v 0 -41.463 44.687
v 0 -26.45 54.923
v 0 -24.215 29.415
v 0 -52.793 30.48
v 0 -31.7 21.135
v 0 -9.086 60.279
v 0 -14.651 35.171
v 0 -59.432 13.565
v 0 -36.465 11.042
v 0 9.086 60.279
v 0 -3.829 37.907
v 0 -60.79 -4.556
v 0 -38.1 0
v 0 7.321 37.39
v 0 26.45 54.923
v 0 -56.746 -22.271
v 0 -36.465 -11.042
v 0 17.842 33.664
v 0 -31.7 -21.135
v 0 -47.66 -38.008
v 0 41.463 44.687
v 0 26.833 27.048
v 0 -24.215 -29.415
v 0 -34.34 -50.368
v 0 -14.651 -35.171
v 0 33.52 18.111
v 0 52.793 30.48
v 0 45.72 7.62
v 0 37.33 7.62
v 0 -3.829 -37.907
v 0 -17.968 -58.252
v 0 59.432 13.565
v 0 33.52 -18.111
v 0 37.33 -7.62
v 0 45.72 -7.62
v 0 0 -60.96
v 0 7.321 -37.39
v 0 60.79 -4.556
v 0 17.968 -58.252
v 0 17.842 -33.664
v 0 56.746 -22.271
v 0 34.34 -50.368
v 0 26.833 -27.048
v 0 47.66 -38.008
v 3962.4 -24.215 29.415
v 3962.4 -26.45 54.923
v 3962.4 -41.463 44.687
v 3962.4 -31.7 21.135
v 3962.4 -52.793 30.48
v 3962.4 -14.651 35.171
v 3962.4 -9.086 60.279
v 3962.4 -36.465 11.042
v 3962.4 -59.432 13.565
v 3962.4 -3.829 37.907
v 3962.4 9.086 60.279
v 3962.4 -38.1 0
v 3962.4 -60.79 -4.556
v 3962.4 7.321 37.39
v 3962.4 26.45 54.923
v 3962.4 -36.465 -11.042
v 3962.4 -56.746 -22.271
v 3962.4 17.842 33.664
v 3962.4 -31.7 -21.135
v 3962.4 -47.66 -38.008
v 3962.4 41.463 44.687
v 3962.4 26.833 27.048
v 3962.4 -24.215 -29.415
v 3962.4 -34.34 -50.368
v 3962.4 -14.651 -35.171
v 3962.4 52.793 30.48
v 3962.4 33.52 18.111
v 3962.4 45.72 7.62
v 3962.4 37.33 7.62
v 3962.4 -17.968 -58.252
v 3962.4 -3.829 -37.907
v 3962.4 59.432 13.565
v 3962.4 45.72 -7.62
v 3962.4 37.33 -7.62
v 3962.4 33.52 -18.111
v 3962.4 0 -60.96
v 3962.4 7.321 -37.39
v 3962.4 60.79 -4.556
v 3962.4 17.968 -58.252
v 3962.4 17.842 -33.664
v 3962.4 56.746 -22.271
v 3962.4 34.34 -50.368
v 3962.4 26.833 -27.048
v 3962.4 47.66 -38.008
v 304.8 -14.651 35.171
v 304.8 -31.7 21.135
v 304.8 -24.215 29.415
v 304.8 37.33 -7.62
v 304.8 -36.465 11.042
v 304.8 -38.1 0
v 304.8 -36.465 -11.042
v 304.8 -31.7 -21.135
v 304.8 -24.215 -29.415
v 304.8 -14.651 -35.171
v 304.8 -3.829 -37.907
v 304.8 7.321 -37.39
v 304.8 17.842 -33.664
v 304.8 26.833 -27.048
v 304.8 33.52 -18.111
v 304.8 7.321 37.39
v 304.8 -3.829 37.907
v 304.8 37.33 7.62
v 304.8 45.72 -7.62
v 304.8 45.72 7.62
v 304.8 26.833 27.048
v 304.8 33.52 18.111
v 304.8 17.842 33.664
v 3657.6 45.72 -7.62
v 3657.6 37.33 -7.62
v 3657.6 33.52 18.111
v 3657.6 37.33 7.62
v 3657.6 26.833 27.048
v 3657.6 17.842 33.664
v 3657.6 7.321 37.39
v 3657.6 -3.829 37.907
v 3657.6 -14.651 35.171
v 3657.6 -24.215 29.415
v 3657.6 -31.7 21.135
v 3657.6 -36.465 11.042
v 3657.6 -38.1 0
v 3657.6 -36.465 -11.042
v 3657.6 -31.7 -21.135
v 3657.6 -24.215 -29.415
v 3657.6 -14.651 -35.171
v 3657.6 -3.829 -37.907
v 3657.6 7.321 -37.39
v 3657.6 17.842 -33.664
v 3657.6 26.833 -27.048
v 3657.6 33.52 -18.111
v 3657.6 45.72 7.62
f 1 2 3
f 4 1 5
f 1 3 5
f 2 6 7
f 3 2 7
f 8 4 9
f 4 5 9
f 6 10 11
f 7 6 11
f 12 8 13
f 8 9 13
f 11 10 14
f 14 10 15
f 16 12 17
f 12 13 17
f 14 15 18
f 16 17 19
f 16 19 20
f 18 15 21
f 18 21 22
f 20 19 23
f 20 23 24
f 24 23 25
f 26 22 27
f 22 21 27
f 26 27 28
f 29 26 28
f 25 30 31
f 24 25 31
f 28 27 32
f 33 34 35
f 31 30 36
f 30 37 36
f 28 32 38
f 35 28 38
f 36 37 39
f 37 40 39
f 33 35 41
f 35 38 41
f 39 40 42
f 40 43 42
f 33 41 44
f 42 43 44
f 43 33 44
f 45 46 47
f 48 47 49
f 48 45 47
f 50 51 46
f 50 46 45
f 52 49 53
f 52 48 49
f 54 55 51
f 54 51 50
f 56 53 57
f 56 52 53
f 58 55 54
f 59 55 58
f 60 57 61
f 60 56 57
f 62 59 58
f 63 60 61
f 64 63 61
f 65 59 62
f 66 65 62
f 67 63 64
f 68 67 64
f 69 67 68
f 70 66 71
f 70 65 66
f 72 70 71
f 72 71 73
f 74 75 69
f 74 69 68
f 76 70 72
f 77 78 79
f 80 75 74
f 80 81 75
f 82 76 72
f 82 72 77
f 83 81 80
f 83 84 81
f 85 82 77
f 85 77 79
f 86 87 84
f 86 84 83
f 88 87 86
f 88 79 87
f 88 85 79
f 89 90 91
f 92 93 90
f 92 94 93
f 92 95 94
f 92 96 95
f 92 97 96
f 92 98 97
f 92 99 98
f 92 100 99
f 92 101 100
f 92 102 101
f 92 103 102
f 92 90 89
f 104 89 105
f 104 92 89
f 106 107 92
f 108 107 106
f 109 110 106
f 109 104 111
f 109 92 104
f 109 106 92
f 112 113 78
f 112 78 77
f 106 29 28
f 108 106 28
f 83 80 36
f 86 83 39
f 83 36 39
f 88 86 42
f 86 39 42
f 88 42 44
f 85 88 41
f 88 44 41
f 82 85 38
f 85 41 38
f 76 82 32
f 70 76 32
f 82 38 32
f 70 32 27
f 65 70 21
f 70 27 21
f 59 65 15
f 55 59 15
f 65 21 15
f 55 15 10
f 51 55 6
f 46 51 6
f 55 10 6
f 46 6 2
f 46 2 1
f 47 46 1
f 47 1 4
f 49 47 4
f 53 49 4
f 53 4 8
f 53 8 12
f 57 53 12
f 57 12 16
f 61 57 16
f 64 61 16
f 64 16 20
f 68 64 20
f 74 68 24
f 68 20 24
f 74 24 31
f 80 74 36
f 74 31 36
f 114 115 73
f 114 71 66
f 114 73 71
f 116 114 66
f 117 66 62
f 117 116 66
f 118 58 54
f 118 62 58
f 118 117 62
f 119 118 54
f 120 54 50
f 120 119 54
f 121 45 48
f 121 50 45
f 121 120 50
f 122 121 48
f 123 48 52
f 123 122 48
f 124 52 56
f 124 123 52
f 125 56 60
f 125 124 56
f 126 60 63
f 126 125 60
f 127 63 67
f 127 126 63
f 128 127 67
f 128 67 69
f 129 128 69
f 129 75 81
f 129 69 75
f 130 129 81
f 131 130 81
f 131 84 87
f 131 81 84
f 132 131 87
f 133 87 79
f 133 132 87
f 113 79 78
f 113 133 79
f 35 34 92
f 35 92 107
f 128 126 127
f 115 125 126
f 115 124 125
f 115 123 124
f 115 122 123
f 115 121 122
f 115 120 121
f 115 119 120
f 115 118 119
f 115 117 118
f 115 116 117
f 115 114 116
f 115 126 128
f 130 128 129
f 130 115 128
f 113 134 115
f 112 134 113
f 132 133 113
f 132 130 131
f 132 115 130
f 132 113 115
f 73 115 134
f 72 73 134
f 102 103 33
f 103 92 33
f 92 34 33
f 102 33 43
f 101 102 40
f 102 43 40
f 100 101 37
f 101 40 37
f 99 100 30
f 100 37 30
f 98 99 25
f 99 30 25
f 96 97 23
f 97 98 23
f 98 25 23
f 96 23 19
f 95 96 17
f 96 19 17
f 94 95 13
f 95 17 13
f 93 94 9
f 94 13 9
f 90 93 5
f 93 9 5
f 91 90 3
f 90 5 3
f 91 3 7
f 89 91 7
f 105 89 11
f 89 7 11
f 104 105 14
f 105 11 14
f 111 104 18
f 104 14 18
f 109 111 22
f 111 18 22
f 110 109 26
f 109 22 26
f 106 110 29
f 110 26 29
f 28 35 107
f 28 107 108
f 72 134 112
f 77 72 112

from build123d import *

# Parameters (mm, degrees)
SKETCH1_R           = 60.96
BOSS_EXTRUDE1_DEPTH = 3962.4
SKETCH2_R           = 38.1
CUT_EXTRUDE1_DEPTH  = 304.8
SKETCH3_W           = 15.24
SKETCH3_H           = 15.24
CUT_EXTRUDE2_DEPTH  = 304.8
CUT_EXTRUDE3_START  = -304.8
SKETCH4_R           = 38.1
CUT_EXTRUDE3_DEPTH  = 304.8
SKETCH5_W           = 15.24
SKETCH5_H           = 15.24
CUT_EXTRUDE4_DEPTH  = 304.8


with BuildPart() as part:
    # Sketch1 → Boss-Extrude1 (new body)
    with BuildSketch(Plane(origin=(0, 0, 0), x_dir=(0, 0, -1), z_dir=(1, 0, 0))):
        Circle(SKETCH1_R)
    extrude(amount=BOSS_EXTRUDE1_DEPTH)

    # Sketch2 → Cut-Extrude1 (cut)
    with BuildSketch(Plane.ZY):
        Circle(SKETCH2_R)
    extrude(amount=-CUT_EXTRUDE1_DEPTH, mode=Mode.SUBTRACT)

    # Sketch3 → Cut-Extrude2 (cut)
    with BuildSketch(Plane.ZY):
        with Locations((0, 38.1)):
            Rectangle(SKETCH3_W, SKETCH3_H)
    extrude(amount=-CUT_EXTRUDE2_DEPTH, mode=Mode.SUBTRACT)

    # Sketch4 → Cut-Extrude3 (cut)
    with BuildSketch(Plane(origin=(3962.4, 0, 0), x_dir=(0, 0, -1), z_dir=(1, 0, 0)).offset(CUT_EXTRUDE3_START)):
        Circle(SKETCH4_R)
    extrude(amount=CUT_EXTRUDE3_DEPTH, mode=Mode.SUBTRACT)

    # Sketch5 → Cut-Extrude4 (cut)
    with BuildSketch(Plane(origin=(3962.4, 0, 0), x_dir=(0, 0, -1), z_dir=(1, 0, 0))):
        with Locations((0, 38.1)):
            Rectangle(SKETCH5_W, SKETCH5_H)
    extrude(amount=-CUT_EXTRUDE4_DEPTH, mode=Mode.SUBTRACT)


solid = part.part
